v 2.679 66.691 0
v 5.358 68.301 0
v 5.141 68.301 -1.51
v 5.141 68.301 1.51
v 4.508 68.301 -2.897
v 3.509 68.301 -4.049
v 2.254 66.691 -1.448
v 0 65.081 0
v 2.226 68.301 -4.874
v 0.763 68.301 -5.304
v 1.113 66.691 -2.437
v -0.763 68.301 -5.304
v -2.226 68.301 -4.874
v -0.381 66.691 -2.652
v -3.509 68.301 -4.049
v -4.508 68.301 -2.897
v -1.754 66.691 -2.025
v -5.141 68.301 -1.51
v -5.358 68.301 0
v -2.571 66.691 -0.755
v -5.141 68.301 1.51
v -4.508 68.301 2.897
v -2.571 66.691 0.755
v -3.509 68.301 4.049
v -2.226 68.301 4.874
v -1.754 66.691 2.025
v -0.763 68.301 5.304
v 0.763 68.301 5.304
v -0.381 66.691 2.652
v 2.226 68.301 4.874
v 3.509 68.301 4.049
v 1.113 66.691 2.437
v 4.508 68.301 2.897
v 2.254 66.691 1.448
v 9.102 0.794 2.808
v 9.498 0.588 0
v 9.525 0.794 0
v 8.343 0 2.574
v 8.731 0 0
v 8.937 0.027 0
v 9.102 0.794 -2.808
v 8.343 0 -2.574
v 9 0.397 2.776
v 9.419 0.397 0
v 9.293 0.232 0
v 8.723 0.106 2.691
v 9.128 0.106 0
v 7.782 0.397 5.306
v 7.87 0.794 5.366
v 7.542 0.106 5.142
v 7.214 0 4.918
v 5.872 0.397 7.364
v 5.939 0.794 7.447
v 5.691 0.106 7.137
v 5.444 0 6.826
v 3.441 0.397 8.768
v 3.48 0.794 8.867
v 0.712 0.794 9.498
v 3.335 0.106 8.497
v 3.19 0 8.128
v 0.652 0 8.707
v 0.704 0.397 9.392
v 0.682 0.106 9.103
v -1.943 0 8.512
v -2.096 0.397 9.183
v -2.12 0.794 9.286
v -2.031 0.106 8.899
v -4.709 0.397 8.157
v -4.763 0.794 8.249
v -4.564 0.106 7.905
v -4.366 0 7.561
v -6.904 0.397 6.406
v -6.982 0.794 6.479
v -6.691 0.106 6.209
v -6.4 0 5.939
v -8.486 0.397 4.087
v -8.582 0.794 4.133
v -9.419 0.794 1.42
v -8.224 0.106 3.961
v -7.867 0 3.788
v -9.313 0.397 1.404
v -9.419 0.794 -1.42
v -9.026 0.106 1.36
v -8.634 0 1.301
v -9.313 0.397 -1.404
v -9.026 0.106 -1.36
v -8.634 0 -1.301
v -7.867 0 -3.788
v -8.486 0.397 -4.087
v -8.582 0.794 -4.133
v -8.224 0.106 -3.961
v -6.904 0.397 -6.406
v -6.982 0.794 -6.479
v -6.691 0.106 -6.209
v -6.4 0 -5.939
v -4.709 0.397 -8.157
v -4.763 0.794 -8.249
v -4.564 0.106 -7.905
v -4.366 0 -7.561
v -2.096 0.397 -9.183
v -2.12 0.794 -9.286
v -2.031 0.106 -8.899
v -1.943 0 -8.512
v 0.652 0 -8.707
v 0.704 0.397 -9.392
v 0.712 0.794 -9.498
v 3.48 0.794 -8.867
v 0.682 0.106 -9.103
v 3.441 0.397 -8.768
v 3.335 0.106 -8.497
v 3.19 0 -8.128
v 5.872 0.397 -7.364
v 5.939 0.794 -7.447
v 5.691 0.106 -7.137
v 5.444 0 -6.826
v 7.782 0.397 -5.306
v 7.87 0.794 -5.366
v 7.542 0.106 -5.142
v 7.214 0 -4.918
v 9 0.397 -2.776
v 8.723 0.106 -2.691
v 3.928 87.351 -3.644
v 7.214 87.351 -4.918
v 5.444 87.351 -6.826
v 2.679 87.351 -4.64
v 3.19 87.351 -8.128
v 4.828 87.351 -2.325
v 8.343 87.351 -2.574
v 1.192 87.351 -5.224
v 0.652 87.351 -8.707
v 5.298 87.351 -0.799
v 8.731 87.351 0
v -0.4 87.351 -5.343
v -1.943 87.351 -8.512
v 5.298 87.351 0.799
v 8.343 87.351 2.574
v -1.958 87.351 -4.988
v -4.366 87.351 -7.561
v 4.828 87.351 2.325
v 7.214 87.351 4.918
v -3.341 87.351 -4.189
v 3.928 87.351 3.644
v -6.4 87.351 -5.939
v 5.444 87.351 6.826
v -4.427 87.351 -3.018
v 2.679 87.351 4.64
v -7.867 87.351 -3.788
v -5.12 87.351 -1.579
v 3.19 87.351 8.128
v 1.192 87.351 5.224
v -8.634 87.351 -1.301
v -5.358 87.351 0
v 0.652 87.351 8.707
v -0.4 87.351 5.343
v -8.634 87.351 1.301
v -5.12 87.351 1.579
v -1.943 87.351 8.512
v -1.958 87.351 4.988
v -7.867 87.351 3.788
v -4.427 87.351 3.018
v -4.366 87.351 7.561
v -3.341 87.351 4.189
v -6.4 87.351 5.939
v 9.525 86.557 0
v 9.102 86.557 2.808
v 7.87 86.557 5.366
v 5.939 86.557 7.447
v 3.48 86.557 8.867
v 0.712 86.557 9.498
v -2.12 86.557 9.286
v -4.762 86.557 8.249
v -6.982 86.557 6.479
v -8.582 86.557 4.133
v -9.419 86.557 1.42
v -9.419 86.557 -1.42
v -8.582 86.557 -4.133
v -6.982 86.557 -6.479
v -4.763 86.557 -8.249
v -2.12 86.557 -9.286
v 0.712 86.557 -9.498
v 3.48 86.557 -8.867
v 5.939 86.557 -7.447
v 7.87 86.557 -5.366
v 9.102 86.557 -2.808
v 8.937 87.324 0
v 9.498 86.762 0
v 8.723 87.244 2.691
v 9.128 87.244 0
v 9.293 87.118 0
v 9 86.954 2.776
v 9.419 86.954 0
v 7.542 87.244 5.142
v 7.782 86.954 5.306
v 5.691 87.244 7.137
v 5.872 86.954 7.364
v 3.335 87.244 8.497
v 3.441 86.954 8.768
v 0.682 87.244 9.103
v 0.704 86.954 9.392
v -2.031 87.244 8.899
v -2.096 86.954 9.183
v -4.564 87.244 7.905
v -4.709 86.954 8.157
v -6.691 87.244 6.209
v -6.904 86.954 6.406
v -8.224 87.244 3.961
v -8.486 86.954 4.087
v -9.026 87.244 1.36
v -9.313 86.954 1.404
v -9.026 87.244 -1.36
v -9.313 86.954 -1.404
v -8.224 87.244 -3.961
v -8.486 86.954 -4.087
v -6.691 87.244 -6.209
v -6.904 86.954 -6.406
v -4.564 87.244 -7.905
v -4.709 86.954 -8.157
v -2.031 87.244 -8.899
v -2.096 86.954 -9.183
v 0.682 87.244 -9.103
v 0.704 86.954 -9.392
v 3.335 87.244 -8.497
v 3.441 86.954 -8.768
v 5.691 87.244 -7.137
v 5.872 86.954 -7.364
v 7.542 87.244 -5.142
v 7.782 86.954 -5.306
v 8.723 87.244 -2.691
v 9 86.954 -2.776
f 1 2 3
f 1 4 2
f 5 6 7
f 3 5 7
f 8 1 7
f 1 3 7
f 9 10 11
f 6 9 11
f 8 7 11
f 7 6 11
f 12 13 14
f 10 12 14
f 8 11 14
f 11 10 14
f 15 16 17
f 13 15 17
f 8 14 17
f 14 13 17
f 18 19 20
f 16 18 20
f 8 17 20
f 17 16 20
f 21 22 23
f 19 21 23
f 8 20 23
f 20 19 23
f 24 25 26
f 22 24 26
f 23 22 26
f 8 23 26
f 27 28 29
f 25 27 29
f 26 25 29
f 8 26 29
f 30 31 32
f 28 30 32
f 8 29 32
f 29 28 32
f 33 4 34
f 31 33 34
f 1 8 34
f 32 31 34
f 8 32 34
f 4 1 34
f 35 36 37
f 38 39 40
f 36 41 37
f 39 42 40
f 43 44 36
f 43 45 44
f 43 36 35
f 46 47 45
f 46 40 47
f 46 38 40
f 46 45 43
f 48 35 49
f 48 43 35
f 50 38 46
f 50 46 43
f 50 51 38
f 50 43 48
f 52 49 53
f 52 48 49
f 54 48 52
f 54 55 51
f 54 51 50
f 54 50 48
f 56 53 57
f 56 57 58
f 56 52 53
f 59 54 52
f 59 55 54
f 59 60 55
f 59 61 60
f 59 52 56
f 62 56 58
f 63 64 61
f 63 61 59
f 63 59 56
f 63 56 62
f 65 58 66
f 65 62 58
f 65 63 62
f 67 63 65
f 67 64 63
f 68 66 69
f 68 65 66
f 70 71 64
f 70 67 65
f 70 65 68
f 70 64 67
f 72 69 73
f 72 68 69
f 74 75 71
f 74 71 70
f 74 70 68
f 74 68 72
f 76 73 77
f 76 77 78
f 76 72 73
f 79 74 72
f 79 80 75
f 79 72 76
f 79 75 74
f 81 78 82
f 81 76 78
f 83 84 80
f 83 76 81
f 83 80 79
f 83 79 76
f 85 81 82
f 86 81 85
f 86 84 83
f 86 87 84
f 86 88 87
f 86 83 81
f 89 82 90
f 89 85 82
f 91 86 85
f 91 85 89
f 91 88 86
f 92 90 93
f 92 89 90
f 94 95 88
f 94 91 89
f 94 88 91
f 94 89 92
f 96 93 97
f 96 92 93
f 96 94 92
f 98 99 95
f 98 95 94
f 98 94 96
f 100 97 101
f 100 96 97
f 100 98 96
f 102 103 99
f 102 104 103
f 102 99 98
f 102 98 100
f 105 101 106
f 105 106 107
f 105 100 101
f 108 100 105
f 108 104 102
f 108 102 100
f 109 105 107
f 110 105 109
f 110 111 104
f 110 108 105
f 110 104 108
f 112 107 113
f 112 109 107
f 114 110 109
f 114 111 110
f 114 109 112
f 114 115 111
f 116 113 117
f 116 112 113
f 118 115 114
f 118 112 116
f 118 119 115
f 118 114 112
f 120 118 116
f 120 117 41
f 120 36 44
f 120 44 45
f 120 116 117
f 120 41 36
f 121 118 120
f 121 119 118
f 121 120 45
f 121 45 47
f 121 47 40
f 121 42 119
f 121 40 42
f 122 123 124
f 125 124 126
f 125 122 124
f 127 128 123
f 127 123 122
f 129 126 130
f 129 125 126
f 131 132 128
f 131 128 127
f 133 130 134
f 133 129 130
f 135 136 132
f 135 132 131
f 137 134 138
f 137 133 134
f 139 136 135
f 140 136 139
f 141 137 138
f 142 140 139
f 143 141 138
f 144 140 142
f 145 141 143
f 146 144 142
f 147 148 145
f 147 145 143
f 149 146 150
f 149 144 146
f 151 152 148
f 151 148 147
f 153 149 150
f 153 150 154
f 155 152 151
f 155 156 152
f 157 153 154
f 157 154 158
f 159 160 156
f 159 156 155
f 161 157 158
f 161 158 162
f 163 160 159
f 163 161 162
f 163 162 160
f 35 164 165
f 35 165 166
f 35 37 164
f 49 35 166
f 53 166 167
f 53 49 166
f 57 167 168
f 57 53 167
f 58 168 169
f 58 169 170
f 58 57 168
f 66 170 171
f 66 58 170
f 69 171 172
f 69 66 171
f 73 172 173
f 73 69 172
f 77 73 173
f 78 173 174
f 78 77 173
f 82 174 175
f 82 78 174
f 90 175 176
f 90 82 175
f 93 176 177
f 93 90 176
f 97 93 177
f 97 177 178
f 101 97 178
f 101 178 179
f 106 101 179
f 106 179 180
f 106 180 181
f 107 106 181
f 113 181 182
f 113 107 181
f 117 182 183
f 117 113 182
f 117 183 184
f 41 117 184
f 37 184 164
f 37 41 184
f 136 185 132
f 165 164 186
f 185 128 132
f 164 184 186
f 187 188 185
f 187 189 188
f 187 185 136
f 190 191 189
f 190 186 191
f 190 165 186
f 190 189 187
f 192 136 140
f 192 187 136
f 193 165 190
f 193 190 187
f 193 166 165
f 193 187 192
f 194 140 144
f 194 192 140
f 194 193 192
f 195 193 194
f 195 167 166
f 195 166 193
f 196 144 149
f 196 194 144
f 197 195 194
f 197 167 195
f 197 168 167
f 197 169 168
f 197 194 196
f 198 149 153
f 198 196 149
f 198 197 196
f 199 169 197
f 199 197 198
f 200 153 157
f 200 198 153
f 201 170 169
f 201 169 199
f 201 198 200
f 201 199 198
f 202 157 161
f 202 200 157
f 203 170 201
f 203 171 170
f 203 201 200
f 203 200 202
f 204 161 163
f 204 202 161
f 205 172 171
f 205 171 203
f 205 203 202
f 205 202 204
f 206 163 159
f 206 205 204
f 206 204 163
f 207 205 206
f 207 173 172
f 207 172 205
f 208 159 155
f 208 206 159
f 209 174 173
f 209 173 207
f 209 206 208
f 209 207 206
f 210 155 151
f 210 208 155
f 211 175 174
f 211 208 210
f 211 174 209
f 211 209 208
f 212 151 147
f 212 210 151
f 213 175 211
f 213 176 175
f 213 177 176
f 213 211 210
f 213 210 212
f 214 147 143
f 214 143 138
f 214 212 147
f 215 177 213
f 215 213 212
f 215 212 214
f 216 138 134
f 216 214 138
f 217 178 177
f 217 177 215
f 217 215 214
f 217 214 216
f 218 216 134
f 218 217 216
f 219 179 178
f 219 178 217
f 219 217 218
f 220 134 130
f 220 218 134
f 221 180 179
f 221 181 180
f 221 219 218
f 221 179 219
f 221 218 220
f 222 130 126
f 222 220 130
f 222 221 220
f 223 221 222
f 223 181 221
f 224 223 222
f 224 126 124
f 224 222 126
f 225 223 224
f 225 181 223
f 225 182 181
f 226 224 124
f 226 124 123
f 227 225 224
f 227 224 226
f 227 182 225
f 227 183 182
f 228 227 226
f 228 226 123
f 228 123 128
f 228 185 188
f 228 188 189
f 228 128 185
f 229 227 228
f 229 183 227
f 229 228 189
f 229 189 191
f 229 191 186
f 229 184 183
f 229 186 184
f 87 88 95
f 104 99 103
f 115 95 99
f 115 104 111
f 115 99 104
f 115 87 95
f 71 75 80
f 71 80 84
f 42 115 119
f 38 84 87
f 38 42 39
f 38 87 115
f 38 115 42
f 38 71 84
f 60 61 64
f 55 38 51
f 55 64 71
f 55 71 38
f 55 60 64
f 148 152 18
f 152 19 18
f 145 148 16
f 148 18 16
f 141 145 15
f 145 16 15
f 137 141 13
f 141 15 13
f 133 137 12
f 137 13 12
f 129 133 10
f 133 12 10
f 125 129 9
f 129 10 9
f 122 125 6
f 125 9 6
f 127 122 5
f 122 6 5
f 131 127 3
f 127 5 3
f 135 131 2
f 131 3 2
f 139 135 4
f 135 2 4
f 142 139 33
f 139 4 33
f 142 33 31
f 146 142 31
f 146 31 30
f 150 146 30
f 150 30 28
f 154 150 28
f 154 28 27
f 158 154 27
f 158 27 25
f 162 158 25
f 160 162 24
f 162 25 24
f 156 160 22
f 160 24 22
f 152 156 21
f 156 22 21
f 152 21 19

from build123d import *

# Parameters (mm, degrees)
F_1_2_13_TAPPED_HOLE1_D     = 10.71626
F_1_2_13_TAPPED_HOLE1_DEPTH = 19.05
F_1_2_13_TAPPED_HOLE1_TIP   = 3.219489309


with BuildPart() as part:
    # Sketch1 → Revolve1 (revolve)
    with BuildSketch(Plane.XY):
        with BuildLine():
            Line((0, 0), (0, 87.3506))
            Line((0, 87.3506), (8.73125, 87.3506))
            ThreePointArc((8.73125, 87.3506), (9.292516008, 87.118116008), (9.525, 86.55685))
            Line((9.525, 86.55685), (9.525, 0.79375))
            ThreePointArc((9.525, 0.79375), (9.292516008, 0.232483992), (8.73125, 0))
            Line((8.73125, 0), (0, 0))
        make_face()
    revolve(axis=Axis((0, 288.392157732, 0), (0, -1, 0)))

    # 1/2-13 Tapped Hole1
    with Locations(Plane(origin=(0, 87.3506, 0), x_dir=(1, 0, 0), z_dir=(0, 1, 0))):
        with Locations((0, 0)):
            Hole(F_1_2_13_TAPPED_HOLE1_D / 2, depth=F_1_2_13_TAPPED_HOLE1_DEPTH)
            with Locations((0, 0, -(F_1_2_13_TAPPED_HOLE1_DEPTH + F_1_2_13_TAPPED_HOLE1_TIP / 2))):  # 118° drill point
                Cone(0, F_1_2_13_TAPPED_HOLE1_D / 2, F_1_2_13_TAPPED_HOLE1_TIP, mode=Mode.SUBTRACT)


solid = part.part
